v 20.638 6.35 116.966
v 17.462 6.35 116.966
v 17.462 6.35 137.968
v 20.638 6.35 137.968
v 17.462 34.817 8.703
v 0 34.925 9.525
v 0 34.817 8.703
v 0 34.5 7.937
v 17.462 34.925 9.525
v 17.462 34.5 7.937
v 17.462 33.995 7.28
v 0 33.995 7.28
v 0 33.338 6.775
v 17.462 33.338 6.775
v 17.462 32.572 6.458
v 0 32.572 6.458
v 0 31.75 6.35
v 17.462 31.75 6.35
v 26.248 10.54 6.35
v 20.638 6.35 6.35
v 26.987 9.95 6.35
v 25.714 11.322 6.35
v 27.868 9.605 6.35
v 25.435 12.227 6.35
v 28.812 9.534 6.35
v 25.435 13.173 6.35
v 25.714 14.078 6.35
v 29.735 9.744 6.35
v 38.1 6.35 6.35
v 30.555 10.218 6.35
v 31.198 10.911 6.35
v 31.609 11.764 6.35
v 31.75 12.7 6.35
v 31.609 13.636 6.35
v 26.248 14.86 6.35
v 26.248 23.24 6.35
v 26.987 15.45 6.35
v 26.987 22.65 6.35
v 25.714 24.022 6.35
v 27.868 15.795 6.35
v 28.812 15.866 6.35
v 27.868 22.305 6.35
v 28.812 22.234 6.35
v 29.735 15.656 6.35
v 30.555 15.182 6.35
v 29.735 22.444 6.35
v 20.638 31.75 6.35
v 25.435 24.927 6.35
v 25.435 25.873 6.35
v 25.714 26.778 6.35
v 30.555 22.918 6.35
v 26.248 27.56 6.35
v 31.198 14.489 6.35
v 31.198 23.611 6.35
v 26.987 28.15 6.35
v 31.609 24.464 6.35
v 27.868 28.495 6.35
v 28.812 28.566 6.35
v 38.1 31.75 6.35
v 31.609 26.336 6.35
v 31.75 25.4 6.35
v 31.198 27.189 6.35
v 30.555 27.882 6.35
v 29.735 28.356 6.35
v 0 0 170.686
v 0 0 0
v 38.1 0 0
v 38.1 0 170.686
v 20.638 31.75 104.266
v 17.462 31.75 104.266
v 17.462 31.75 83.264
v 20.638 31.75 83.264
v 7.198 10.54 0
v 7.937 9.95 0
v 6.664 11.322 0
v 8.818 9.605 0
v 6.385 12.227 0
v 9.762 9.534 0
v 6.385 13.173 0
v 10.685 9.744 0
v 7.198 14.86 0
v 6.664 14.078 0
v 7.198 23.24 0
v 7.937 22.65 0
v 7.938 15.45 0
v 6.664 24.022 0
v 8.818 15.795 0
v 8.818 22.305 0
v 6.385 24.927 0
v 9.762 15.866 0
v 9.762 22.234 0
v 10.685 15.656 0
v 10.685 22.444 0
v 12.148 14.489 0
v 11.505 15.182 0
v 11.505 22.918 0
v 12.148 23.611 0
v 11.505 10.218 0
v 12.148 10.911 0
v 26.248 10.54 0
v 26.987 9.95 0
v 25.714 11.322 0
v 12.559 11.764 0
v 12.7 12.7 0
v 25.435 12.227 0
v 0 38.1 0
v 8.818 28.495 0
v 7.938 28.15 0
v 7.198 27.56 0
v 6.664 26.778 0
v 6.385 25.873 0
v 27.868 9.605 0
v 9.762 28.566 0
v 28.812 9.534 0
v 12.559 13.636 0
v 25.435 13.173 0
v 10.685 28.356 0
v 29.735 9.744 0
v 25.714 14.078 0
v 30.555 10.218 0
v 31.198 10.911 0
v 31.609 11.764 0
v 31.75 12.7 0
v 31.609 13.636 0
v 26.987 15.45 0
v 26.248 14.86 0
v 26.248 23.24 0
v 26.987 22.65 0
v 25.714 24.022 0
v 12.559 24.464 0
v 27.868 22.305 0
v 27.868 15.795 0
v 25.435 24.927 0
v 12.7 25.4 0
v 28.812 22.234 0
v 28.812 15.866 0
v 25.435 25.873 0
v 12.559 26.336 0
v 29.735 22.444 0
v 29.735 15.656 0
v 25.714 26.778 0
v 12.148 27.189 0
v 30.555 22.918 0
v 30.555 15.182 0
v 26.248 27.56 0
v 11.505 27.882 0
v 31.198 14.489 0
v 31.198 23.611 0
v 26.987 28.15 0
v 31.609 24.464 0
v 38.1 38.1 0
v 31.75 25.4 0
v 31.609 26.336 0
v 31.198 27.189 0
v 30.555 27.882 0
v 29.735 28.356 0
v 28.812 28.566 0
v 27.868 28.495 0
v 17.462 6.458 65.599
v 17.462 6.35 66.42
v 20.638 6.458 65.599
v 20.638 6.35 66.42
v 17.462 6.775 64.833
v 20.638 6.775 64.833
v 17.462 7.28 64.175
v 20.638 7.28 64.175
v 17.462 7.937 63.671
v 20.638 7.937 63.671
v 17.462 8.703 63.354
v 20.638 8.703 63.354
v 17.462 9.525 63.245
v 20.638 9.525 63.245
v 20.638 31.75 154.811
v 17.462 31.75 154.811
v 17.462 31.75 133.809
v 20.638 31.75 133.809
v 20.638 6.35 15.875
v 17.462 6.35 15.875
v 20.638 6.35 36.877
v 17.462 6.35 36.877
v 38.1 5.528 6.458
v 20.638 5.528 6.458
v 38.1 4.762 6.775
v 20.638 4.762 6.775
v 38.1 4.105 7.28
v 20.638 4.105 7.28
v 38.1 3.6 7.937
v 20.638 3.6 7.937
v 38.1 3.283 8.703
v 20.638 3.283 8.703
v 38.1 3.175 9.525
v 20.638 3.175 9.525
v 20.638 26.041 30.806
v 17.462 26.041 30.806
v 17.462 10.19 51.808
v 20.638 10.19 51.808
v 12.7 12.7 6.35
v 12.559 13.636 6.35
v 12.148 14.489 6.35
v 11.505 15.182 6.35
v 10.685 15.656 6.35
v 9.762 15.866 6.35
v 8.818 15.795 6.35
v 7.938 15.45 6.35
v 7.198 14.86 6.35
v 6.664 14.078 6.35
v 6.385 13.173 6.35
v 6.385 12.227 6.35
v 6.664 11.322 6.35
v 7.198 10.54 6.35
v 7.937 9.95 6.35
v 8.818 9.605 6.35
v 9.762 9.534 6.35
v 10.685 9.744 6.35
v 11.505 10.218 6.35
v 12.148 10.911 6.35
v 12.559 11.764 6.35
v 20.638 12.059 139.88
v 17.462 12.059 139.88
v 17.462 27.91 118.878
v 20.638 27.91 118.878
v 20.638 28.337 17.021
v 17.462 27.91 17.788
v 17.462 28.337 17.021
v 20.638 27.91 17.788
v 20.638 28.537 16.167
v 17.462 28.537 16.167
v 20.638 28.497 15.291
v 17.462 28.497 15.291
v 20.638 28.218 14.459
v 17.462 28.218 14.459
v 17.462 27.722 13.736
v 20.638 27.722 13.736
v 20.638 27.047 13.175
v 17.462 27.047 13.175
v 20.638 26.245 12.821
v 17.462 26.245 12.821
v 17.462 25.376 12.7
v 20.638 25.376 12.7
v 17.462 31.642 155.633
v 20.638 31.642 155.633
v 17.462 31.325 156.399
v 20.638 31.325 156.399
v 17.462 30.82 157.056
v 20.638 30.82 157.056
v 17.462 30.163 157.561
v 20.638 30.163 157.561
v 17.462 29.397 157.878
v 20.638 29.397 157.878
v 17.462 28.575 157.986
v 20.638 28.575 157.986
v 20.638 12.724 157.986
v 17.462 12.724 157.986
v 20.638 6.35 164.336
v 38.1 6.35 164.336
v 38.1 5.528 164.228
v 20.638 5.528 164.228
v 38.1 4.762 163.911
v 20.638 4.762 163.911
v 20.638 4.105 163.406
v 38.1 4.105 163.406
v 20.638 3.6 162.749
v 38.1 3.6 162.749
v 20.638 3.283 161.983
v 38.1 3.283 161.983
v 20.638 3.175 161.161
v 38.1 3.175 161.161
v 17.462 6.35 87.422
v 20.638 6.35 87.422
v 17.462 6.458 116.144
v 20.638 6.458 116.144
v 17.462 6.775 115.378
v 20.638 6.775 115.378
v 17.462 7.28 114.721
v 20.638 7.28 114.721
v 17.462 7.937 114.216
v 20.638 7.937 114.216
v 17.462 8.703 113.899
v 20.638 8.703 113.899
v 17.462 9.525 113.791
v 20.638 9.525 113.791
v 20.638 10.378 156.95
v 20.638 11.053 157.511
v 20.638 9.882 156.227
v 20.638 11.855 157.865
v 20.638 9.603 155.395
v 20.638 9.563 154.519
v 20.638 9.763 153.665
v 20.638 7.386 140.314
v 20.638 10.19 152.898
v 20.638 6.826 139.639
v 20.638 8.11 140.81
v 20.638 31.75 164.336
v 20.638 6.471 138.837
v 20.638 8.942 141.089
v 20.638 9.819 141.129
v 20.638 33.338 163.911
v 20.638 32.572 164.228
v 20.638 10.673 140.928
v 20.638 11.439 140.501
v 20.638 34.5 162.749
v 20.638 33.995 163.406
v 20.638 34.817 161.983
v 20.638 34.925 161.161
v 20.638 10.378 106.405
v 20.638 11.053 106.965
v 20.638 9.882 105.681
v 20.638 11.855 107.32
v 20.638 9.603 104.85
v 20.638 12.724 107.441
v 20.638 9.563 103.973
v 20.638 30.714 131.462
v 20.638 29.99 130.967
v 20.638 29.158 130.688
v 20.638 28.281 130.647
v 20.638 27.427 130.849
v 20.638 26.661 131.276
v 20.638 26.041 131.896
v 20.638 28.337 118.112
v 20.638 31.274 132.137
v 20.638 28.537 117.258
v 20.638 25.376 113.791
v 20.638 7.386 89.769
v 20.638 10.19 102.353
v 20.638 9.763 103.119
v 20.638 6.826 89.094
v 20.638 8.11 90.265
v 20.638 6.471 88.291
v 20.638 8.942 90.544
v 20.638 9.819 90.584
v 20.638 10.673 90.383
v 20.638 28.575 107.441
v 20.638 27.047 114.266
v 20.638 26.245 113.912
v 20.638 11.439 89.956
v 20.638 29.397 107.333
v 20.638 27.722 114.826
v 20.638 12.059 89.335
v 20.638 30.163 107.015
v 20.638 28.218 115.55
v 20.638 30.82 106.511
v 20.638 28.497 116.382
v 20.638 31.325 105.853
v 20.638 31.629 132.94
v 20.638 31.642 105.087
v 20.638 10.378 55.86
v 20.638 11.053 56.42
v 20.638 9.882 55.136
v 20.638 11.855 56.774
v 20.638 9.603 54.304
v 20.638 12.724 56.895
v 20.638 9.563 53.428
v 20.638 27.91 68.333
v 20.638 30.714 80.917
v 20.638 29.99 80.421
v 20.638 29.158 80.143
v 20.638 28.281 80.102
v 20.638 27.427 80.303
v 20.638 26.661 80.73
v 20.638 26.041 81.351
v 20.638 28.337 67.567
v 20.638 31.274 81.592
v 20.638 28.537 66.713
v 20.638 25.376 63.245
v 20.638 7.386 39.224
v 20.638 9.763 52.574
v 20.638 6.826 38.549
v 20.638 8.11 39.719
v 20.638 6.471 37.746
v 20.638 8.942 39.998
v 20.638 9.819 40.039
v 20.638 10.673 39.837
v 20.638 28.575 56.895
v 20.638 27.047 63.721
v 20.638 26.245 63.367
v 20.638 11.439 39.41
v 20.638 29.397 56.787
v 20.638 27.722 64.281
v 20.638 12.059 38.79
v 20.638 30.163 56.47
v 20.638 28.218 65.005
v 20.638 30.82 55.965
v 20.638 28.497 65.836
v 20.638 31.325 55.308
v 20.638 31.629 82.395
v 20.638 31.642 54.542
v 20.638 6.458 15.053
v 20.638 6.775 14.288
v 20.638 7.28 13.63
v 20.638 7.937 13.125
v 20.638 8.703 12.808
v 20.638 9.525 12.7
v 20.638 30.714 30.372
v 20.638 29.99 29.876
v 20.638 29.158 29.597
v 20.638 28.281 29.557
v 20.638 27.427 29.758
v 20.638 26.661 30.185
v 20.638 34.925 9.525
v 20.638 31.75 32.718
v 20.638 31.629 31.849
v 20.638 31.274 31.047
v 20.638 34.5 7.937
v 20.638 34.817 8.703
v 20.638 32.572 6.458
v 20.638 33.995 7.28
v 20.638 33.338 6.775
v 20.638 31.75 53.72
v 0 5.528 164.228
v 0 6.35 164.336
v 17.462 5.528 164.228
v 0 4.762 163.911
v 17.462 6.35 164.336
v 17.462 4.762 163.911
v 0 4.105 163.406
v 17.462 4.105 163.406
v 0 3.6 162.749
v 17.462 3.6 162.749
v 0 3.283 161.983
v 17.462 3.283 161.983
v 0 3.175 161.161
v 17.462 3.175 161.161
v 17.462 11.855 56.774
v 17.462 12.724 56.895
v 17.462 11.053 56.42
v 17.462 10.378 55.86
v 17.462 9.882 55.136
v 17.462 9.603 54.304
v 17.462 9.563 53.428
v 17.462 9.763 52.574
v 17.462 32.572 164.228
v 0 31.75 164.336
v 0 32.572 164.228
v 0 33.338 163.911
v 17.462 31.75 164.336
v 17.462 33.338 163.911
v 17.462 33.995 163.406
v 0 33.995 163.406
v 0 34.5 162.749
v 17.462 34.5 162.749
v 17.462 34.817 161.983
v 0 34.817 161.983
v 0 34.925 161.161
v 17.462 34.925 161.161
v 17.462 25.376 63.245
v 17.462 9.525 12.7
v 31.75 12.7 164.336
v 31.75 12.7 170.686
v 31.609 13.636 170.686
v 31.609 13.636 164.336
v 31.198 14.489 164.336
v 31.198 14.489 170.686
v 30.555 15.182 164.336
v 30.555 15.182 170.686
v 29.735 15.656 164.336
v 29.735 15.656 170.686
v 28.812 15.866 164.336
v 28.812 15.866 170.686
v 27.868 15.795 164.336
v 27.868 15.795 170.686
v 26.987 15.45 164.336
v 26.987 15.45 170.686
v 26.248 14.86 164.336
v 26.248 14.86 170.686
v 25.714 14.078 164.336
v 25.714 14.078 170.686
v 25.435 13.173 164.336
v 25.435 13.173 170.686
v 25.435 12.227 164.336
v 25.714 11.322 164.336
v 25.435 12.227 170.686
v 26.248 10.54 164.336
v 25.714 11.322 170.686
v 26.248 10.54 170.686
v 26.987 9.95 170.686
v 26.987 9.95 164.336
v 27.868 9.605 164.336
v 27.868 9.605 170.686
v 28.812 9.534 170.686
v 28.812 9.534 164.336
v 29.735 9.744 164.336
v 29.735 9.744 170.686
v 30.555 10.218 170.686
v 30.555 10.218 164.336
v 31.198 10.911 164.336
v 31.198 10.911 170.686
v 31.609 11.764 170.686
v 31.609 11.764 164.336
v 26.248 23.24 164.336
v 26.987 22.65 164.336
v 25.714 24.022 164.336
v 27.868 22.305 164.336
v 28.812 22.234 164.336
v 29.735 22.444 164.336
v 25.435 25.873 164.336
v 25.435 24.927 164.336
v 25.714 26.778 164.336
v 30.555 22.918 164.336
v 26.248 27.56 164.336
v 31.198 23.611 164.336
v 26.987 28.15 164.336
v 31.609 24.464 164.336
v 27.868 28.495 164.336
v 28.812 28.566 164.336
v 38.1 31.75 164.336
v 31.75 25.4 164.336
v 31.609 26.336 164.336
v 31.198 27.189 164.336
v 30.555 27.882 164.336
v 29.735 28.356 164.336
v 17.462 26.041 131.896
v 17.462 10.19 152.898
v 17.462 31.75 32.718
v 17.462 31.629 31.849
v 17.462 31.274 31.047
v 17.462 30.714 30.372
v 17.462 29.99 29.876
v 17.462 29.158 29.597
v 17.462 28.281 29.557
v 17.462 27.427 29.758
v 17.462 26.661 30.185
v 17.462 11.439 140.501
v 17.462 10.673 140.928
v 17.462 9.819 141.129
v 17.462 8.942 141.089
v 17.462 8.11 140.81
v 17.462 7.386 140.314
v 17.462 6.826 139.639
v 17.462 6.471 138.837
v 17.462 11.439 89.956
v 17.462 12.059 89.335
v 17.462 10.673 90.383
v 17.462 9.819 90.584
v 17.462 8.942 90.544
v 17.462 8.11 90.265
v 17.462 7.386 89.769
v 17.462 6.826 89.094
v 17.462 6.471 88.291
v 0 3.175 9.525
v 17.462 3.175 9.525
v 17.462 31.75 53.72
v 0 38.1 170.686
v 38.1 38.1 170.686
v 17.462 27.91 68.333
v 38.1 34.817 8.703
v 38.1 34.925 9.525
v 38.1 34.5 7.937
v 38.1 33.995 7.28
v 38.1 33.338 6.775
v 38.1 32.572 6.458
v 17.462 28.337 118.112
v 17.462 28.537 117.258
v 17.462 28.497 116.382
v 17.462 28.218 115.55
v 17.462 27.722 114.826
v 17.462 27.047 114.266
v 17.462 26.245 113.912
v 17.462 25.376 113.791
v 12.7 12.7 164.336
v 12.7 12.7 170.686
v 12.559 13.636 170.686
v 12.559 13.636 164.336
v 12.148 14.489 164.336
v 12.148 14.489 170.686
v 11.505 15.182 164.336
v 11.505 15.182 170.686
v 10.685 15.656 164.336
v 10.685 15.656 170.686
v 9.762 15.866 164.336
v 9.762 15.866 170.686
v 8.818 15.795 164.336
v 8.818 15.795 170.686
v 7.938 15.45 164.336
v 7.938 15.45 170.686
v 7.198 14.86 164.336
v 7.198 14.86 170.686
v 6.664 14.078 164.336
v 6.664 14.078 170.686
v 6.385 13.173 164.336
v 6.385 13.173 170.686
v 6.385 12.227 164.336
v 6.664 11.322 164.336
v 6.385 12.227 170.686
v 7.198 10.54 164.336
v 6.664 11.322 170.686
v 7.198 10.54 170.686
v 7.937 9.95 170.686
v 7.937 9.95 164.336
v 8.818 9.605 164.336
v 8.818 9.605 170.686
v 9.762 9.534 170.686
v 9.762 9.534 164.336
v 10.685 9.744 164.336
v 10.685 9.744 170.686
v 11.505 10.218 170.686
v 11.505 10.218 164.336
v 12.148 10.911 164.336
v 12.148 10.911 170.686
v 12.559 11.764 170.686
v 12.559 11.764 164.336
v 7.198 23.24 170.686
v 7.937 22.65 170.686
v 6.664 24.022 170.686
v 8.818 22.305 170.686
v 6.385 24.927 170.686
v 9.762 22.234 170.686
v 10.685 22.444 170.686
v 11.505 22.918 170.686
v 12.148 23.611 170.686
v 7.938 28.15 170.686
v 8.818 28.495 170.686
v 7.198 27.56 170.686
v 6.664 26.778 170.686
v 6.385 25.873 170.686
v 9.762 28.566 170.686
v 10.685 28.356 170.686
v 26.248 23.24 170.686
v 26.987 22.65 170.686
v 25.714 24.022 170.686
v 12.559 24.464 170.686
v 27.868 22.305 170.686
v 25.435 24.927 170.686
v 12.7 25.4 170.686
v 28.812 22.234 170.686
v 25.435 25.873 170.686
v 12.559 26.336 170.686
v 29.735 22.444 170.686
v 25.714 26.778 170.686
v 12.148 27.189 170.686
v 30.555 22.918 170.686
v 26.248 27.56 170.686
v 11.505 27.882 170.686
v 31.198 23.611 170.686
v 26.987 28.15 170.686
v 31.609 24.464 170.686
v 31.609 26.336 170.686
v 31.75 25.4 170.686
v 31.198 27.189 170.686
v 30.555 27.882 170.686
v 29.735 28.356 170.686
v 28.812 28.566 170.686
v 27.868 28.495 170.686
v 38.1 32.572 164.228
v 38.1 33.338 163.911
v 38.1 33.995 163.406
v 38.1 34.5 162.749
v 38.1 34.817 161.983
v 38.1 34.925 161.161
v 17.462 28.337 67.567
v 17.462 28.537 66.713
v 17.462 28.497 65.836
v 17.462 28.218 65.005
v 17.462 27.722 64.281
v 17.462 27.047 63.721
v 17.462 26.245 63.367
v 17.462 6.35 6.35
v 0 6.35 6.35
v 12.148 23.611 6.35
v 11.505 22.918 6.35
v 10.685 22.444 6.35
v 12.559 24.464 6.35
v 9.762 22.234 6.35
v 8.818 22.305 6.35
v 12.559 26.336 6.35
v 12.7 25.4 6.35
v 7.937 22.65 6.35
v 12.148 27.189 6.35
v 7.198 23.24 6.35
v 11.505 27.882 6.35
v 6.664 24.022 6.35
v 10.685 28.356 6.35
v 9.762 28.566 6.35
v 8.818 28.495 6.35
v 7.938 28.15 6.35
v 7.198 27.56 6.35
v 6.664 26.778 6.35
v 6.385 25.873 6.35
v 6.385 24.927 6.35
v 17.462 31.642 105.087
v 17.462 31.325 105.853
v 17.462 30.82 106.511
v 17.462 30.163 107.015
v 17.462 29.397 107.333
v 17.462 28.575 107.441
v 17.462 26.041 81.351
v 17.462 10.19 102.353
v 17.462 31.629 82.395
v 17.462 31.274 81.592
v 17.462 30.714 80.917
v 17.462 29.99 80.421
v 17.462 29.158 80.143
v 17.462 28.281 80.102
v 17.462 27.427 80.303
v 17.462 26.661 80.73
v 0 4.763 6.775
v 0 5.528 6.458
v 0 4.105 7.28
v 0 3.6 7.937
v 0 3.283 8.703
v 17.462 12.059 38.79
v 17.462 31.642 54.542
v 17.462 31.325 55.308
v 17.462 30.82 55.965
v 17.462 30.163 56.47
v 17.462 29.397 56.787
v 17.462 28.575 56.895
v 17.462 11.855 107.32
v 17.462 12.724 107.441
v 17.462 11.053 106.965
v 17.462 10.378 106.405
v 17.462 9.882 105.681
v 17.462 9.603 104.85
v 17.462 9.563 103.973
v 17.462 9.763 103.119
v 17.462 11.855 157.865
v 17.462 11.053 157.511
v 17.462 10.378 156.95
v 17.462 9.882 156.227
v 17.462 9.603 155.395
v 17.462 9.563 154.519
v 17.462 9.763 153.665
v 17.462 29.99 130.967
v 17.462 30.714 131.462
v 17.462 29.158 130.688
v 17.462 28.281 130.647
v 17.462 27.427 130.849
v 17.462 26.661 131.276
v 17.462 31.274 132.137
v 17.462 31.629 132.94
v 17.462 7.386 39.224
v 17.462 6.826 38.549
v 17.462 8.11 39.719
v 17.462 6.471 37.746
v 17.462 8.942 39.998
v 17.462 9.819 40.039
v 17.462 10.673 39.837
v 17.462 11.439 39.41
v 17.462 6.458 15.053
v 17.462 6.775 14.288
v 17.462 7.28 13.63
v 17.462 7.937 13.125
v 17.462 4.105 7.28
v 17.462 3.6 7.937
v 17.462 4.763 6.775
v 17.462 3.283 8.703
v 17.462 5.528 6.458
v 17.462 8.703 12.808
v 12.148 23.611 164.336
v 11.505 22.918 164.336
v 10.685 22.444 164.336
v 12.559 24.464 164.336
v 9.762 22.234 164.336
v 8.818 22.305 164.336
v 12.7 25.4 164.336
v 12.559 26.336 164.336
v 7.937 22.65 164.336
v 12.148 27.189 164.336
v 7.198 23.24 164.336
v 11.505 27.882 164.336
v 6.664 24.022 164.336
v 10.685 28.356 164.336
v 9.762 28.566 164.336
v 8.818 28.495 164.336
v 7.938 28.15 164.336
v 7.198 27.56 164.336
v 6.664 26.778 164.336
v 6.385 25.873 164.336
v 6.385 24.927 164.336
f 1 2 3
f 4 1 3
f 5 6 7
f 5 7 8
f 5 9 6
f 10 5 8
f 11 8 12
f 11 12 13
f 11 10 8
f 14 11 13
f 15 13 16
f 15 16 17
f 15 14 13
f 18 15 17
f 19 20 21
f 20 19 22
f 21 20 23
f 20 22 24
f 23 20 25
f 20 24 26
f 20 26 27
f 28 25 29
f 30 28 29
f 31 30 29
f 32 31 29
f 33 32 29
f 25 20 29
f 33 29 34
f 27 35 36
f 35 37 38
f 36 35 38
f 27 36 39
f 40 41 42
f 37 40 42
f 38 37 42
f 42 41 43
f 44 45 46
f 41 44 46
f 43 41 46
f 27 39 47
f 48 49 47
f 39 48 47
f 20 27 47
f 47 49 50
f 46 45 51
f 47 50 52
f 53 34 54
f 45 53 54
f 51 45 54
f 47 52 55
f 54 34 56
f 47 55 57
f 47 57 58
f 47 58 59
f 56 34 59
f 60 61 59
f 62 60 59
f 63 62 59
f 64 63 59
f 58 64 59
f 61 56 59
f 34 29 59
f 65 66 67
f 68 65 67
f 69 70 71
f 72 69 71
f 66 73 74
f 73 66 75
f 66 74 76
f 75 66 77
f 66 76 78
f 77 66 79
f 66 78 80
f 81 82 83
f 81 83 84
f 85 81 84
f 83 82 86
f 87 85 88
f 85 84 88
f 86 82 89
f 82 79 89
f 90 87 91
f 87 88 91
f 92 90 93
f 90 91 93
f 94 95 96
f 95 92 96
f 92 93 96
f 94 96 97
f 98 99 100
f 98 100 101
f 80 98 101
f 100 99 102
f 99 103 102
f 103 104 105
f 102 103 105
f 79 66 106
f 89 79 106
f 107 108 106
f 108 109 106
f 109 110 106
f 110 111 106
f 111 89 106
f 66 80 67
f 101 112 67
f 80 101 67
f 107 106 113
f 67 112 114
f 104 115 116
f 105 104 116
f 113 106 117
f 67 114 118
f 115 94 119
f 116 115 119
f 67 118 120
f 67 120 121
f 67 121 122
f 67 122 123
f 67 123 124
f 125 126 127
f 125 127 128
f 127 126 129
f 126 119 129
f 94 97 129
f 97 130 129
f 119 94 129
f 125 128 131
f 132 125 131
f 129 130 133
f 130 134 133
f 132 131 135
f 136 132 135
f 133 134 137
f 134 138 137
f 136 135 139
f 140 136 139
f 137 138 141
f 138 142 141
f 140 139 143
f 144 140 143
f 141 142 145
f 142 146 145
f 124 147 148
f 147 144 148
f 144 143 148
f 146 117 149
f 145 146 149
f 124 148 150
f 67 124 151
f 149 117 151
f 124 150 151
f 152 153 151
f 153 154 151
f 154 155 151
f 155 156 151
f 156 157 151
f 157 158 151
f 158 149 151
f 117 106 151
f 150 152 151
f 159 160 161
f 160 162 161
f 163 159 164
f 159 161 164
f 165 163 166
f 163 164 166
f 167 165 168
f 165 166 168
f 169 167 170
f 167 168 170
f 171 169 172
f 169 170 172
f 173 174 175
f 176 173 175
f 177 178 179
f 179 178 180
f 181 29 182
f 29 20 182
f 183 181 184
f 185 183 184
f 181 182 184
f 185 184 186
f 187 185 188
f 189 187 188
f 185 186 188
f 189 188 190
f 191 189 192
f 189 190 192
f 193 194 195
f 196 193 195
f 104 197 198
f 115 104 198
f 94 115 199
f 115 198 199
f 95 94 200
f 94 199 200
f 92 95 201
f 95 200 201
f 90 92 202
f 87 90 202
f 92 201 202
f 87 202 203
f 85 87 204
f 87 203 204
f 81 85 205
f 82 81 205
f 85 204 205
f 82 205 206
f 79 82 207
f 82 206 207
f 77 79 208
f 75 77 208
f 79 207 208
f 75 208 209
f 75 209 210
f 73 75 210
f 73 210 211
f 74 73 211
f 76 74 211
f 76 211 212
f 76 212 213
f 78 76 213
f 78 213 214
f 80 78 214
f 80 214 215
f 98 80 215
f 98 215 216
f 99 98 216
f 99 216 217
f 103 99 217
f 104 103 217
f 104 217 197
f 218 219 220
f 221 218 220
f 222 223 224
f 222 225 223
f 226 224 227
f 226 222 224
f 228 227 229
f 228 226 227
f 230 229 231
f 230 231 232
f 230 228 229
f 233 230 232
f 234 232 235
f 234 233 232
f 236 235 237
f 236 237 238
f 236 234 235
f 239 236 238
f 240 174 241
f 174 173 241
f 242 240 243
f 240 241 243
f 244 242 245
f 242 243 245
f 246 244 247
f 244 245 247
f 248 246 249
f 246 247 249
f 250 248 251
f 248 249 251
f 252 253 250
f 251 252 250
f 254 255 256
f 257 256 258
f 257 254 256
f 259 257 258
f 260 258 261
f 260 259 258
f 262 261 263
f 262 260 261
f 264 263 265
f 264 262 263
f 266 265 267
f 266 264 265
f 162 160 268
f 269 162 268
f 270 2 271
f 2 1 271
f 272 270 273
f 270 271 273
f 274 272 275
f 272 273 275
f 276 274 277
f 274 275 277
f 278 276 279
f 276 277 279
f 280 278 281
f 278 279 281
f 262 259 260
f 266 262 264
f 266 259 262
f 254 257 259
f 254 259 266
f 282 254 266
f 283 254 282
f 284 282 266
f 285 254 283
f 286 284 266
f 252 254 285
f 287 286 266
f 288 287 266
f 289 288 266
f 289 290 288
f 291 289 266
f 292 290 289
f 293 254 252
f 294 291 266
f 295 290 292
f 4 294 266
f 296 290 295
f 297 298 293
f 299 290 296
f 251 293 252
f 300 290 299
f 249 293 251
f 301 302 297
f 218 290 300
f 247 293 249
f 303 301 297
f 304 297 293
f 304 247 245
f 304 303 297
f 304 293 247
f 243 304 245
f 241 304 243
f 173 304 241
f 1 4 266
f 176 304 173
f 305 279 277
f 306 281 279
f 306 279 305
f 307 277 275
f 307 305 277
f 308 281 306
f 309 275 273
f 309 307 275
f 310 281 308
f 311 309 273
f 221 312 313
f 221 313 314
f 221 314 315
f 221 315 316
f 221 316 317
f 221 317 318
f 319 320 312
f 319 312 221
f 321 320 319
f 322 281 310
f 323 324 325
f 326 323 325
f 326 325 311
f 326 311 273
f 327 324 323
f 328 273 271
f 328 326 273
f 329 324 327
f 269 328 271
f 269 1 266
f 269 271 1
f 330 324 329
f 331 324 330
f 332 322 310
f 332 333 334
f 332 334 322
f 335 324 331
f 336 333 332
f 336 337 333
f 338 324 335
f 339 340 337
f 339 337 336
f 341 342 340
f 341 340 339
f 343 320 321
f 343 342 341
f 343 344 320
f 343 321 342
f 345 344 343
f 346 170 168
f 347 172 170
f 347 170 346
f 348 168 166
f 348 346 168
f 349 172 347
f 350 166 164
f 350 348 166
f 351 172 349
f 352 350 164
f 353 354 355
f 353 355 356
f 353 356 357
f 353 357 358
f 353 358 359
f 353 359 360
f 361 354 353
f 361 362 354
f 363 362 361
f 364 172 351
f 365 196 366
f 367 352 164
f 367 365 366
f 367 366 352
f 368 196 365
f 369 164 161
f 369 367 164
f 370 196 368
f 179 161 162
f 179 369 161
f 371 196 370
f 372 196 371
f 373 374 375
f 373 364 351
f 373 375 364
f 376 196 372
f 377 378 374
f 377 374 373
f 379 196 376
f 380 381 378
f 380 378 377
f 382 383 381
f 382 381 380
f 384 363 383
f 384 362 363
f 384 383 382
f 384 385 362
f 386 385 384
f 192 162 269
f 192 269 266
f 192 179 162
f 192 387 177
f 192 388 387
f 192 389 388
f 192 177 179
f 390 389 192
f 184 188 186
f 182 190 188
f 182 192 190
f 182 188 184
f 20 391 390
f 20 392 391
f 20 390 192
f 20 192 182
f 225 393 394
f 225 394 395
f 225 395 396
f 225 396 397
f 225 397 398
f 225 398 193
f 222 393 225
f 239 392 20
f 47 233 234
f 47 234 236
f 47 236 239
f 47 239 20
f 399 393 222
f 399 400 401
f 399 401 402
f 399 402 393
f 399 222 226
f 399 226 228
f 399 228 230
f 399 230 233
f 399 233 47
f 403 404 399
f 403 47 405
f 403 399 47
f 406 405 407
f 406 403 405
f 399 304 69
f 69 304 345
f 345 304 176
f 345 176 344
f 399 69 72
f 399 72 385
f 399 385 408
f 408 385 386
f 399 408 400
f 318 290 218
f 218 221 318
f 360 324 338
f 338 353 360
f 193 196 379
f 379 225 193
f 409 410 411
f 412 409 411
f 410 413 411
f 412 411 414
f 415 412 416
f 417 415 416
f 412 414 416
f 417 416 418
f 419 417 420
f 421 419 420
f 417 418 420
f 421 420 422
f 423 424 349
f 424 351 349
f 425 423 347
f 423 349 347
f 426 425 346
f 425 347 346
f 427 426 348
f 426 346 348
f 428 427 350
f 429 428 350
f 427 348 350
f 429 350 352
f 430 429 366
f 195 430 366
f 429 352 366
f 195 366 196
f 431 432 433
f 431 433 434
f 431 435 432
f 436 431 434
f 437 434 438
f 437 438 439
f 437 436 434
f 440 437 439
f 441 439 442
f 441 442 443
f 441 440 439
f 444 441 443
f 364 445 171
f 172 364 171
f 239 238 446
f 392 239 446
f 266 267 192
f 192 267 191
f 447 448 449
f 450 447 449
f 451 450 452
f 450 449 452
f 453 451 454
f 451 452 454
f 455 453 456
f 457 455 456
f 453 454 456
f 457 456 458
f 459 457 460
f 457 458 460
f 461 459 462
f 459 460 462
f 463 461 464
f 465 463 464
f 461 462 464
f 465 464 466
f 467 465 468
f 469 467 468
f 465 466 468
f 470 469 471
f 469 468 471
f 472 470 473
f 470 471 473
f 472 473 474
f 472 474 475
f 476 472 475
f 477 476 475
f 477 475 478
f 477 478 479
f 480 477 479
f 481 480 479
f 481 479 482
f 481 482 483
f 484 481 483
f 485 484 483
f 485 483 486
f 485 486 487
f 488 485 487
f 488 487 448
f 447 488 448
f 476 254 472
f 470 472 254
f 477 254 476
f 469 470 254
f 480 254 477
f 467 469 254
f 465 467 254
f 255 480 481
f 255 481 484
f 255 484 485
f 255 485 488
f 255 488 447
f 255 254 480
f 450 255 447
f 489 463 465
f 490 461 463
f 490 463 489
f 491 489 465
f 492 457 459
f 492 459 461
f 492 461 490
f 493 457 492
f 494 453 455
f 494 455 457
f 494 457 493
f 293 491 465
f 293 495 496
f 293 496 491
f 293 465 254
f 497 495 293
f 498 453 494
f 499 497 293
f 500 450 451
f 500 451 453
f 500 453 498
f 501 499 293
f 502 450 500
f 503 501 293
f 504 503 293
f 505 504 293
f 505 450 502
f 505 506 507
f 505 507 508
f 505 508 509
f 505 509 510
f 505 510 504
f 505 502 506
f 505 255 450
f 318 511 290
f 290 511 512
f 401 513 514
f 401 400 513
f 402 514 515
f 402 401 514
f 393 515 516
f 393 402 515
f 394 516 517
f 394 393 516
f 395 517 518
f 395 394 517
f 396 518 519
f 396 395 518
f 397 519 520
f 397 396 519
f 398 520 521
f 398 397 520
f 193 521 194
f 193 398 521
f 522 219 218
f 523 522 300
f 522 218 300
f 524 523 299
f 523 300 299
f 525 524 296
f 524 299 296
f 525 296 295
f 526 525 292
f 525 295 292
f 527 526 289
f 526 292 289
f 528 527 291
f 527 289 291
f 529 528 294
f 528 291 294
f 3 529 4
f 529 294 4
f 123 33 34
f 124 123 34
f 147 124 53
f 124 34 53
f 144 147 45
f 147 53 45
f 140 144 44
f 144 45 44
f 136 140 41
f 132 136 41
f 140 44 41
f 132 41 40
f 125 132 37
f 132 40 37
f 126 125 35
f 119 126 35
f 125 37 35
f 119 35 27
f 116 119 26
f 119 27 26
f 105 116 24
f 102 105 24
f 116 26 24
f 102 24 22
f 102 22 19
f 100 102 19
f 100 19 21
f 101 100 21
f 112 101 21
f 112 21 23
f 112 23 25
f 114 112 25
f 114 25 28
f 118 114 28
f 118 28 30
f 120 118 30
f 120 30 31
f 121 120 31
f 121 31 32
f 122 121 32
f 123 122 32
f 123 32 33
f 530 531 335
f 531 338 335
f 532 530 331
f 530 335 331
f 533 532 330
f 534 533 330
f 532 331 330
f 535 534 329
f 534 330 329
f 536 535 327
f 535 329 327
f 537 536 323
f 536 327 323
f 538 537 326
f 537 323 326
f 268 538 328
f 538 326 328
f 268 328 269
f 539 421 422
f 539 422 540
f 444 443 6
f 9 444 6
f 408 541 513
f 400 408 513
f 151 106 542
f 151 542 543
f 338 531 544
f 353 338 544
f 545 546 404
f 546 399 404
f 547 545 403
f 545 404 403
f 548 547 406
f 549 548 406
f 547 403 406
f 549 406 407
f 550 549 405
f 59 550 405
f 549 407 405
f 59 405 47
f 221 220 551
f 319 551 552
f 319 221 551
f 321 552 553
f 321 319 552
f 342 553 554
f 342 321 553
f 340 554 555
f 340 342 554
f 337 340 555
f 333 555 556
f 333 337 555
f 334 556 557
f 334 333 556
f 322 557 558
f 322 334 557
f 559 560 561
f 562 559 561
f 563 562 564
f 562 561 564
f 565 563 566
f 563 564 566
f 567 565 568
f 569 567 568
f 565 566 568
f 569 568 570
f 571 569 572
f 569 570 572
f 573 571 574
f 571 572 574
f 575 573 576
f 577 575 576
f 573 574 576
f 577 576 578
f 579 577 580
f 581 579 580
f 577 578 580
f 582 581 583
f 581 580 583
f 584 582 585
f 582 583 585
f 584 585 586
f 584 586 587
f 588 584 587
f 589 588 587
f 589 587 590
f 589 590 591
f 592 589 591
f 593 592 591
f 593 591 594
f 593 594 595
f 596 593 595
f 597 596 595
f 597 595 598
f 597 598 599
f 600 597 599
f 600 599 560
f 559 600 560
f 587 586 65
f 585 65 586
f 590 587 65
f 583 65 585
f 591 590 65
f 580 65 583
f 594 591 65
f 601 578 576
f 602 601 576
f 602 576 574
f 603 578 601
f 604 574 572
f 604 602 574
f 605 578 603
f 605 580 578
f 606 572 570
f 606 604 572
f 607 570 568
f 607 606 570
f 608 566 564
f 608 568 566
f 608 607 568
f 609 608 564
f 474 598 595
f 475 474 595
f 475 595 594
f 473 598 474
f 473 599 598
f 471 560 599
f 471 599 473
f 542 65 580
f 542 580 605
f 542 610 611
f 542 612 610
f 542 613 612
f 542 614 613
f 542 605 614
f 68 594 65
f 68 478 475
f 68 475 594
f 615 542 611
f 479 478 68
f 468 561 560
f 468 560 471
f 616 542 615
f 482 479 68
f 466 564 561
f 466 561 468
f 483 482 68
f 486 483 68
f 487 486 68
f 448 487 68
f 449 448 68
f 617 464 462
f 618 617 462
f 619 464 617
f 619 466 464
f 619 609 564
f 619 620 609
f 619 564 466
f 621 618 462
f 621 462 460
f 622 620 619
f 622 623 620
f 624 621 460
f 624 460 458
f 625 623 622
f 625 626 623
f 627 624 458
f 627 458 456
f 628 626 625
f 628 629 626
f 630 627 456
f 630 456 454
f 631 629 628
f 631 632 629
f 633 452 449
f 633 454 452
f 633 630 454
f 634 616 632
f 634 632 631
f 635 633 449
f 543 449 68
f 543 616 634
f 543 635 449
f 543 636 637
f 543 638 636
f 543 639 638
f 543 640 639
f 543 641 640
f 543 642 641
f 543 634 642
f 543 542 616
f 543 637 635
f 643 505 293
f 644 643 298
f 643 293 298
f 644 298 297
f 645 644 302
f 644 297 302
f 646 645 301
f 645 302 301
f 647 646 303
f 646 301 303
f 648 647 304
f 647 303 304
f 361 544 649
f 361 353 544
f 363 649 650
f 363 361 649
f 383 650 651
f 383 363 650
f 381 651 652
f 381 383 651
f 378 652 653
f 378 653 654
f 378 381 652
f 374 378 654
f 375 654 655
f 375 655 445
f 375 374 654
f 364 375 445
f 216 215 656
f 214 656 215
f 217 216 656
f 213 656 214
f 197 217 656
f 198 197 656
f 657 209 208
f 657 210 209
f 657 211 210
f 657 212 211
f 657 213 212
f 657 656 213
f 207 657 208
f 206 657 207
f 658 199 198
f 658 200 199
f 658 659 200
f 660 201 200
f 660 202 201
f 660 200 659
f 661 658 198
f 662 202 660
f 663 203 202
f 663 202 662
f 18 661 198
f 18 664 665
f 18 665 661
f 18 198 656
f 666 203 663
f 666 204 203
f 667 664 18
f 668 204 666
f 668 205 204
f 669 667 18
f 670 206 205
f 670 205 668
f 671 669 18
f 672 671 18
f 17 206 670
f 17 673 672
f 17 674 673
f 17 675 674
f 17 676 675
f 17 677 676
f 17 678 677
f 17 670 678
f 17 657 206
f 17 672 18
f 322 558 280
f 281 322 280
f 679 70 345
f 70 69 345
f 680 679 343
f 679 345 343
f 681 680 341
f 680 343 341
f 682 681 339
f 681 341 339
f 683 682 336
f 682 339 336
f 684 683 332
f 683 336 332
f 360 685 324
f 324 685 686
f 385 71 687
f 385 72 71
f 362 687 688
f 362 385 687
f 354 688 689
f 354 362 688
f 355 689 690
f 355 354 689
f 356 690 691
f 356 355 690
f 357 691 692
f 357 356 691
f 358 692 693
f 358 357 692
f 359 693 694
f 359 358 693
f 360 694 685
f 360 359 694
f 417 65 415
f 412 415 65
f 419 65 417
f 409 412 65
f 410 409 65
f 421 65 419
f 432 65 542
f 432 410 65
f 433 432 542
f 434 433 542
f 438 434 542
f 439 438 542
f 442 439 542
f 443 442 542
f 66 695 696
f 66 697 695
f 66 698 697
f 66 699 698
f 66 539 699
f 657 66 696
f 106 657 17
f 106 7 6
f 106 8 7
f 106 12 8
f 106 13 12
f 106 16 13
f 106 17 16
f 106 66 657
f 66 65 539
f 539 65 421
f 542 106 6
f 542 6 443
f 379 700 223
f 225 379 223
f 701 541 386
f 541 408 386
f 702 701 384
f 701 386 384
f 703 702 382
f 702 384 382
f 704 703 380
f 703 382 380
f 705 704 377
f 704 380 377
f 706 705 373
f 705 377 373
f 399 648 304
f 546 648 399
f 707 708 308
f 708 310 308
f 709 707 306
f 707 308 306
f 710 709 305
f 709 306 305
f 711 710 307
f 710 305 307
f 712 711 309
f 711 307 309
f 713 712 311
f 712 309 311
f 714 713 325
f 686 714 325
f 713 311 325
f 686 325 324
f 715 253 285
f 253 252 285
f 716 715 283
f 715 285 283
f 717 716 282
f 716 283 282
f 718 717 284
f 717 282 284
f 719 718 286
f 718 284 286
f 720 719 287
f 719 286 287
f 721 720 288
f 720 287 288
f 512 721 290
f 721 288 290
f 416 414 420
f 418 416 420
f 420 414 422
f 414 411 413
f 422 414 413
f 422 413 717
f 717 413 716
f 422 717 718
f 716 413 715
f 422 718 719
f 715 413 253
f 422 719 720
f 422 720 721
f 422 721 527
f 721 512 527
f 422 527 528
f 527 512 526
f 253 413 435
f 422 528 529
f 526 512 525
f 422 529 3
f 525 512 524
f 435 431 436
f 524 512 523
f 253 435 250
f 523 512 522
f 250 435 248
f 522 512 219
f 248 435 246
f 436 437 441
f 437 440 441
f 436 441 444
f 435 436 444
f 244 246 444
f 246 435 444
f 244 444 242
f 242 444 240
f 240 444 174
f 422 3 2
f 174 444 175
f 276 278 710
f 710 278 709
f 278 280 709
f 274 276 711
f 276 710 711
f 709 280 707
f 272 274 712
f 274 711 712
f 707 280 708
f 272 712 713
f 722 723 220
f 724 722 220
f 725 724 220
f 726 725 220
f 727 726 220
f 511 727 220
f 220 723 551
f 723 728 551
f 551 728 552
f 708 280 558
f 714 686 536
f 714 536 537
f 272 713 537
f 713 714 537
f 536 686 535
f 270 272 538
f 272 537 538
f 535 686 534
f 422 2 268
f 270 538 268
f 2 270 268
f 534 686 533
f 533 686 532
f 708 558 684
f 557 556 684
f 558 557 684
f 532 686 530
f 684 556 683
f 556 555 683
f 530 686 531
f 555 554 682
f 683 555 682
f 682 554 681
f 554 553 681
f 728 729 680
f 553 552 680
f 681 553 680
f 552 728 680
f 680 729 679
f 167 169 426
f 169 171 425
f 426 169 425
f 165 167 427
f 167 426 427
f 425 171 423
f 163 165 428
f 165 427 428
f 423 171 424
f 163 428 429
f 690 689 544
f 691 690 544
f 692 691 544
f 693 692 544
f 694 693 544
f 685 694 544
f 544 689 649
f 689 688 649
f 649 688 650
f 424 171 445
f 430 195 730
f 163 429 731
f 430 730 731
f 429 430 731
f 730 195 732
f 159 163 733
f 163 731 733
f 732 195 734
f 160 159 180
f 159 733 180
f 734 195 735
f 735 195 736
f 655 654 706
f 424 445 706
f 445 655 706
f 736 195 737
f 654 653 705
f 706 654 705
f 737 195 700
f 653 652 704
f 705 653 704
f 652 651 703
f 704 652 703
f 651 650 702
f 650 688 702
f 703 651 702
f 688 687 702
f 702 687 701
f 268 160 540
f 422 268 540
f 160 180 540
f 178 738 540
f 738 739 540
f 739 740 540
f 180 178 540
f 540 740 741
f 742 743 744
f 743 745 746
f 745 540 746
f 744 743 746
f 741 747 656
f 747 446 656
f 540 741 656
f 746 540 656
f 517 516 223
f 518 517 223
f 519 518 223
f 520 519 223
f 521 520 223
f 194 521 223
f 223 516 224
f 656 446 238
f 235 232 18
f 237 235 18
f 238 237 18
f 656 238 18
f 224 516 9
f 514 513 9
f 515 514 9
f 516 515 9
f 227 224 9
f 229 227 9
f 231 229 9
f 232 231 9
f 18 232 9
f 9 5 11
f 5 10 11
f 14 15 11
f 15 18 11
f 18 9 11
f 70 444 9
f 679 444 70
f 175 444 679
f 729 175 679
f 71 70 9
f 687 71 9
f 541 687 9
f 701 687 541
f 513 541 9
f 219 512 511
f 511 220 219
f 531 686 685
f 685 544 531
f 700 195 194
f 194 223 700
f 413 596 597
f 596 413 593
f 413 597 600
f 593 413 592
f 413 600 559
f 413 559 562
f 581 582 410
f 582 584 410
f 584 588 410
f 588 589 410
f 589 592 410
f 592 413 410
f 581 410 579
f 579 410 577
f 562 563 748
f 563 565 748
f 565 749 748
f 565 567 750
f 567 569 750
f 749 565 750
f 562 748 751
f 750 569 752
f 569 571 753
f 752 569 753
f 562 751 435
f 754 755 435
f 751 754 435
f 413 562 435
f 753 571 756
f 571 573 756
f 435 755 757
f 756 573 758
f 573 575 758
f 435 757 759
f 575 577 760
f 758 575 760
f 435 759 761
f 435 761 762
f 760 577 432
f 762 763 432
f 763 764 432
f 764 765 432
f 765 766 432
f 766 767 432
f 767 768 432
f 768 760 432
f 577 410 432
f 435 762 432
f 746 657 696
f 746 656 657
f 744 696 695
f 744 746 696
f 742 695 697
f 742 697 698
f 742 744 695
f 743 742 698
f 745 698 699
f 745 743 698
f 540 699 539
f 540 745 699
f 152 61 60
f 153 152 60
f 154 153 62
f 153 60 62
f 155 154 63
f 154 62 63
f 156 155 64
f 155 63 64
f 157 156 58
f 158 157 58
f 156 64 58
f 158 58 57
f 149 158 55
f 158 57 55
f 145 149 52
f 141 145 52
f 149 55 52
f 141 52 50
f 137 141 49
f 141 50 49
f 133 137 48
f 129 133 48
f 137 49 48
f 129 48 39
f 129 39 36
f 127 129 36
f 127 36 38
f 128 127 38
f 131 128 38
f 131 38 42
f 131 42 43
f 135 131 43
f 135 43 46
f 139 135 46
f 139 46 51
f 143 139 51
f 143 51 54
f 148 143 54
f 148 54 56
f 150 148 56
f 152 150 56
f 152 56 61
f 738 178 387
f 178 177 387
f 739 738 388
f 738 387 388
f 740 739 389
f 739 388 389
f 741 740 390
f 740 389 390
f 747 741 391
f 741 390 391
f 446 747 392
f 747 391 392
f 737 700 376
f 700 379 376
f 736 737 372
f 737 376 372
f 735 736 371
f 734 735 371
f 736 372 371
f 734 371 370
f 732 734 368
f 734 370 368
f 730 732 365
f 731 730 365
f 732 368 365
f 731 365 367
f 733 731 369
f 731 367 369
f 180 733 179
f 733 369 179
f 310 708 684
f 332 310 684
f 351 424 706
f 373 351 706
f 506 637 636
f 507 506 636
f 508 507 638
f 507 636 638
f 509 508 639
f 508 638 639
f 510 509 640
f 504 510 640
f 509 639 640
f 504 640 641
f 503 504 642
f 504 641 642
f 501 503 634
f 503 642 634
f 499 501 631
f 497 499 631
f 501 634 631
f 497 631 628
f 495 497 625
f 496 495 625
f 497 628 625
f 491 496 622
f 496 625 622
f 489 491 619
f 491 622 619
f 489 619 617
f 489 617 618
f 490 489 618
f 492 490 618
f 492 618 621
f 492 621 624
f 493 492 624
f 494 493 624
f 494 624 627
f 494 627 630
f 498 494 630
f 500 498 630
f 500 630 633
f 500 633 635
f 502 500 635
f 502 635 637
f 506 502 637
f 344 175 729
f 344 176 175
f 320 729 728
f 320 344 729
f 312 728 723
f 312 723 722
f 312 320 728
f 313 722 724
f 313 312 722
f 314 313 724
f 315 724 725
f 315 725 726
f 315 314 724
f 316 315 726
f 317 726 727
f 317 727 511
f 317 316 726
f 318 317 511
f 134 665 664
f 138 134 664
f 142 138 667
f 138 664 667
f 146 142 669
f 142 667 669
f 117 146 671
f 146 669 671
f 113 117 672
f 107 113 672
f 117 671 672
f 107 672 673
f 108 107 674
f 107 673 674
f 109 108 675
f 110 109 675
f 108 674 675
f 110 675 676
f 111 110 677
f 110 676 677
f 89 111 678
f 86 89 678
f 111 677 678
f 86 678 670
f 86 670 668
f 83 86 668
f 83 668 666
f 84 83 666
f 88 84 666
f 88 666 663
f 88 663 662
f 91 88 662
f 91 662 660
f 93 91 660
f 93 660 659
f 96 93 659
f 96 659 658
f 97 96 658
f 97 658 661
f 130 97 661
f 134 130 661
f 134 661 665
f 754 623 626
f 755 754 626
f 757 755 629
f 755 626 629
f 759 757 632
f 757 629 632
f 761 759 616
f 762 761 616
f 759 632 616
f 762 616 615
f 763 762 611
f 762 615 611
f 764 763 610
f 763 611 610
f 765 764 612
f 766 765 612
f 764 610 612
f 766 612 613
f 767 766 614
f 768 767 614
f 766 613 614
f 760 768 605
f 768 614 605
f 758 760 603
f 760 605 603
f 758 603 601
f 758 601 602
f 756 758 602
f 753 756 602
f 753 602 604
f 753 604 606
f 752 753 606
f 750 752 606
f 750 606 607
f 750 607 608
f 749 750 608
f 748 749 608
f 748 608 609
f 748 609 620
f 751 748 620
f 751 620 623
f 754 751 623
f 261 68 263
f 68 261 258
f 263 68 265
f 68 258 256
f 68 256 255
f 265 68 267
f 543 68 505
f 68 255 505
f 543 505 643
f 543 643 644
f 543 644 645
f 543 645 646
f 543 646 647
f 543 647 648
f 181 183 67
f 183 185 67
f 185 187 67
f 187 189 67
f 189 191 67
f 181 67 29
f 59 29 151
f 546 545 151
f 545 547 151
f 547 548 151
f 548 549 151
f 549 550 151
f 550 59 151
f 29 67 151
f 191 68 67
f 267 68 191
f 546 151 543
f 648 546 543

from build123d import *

# Parameters (mm, degrees)
SKETCH2_W                   = 38.1
SKETCH2_H                   = 38.1
BOSS_EXTRUDE1_DEPTH         = 170.686028715
SKETCH3_W                   = 157.986028715
SKETCH3_H                   = 31.75
CUT_EXTRUDE1_DEPTH          = 17.4625
FILLET1_R                   = 3.175
FILLET1_OF_MIRROR1_R        = 3.175
F_1_4_0_25_DIAMETER_HOLE1_D = 6.35
CUT_EXTRUDE2_REACH          = 178.1
FILLET3_R                   = 3.175


with BuildPart() as part:
    # Sketch2 → Boss-Extrude1 (new body)
    with BuildSketch(Plane.XY):
        with Locations((19.05, 19.05)):
            Rectangle(SKETCH2_W, SKETCH2_H)
    extrude(amount=BOSS_EXTRUDE1_DEPTH)

    # Sketch3 → Cut-Extrude1 (cut)
    with BuildSketch(Plane(origin=(38.1, 0, 0), x_dir=(0, 0, -1), z_dir=(1, 0, 0))):
        with Locations((-85.343014357, 19.05)):
            Rectangle(SKETCH3_W, SKETCH3_H)
    cut_extrude1 = extrude(amount=-CUT_EXTRUDE1_DEPTH, mode=Mode.SUBTRACT)

    # Fillet1
    fillet1_edges = [part.edges().sort_by_distance(p)[0] for p in [
        (29.36875, 3.175, 164.336028715),
        (29.36875, 34.925, 164.336028715),
        (29.36875, 34.925, 6.35),
        (29.36875, 3.175, 6.35),
    ]]
    fillet(fillet1_edges, radius=FILLET1_R)

    # Mirror1: Cut-Extrude1 across plane
    add(cut_extrude1.mirror(Plane(origin=(19.05, 0, 0), x_dir=(0, 0, 1), z_dir=(1, 0, 0))), mode=Mode.SUBTRACT)

    # Fillet1 of Mirror1
    fillet1_of_mirror1_edges = [part.edges().sort_by_distance(p)[0] for p in [
        (8.73125, 3.175, 164.336028715),
        (8.73125, 34.925, 164.336028715),
        (8.73125, 34.925, 6.35),
        (8.73125, 3.175, 6.35),
    ]]
    fillet(fillet1_of_mirror1_edges, radius=FILLET1_OF_MIRROR1_R)

    # 1/4 (0.25) Diameter Hole1 (through all)
    with Locations(Plane(origin=(0, 0, 0), x_dir=(-1, 0, 0), z_dir=(0, 0, -1))):
        with Locations((-9.525, 25.4), (-9.525, 12.7), (-28.575, 12.7), (-28.575, 25.4)):
            Hole(F_1_4_0_25_DIAMETER_HOLE1_D / 2)

    # Sketch7 → Cut-Extrude2 (cut, up to next)
    with BuildSketch(Plane.ZY.offset(-17.4625), mode=Mode.PRIVATE) as cut_extrude2_sk1:
        Polygon((12.7, 31.75), (12.7, 6.35), (46.354412352, 6.35), align=None)
    cut_extrude2_tool1 = extrude(cut_extrude2_sk1.sketch, amount=-CUT_EXTRUDE2_REACH, mode=Mode.PRIVATE) & part.part
    # Sketch7 → Cut-Extrude2 (cut, up to next)
    with BuildSketch(Plane.ZY.offset(-17.4625), mode=Mode.PRIVATE) as cut_extrude2_sk2:
        Polygon((23.240930553, 31.75), (56.895342905, 6.35), (56.895342905, 31.75), align=None)
    cut_extrude2_tool2 = extrude(cut_extrude2_sk2.sketch, amount=-CUT_EXTRUDE2_REACH, mode=Mode.PRIVATE) & part.part
    # Sketch7 → Cut-Extrude2 (cut, up to next)
    with BuildSketch(Plane.ZY.offset(-17.4625), mode=Mode.PRIVATE) as cut_extrude2_sk3:
        Polygon((63.245342905, 31.75), (63.245342905, 6.35), (96.899755257, 6.35), align=None)
    cut_extrude2_tool3 = extrude(cut_extrude2_sk3.sketch, amount=-CUT_EXTRUDE2_REACH, mode=Mode.PRIVATE) & part.part
    # Sketch7 → Cut-Extrude2 (cut, up to next)
    with BuildSketch(Plane.ZY.offset(-17.4625), mode=Mode.PRIVATE) as cut_extrude2_sk4:
        Polygon((73.786273458, 31.75), (107.44068581, 6.35), (107.44068581, 31.75), align=None)
    cut_extrude2_tool4 = extrude(cut_extrude2_sk4.sketch, amount=-CUT_EXTRUDE2_REACH, mode=Mode.PRIVATE) & part.part
    # Sketch7 → Cut-Extrude2 (cut, up to next)
    with BuildSketch(Plane.ZY.offset(-17.4625), mode=Mode.PRIVATE) as cut_extrude2_sk5:
        Polygon((113.79068581, 31.75), (113.79068581, 6.35), (147.445098162, 6.35), align=None)
    cut_extrude2_tool5 = extrude(cut_extrude2_sk5.sketch, amount=-CUT_EXTRUDE2_REACH, mode=Mode.PRIVATE) & part.part
    # Sketch7 → Cut-Extrude2 (cut, up to next)
    with BuildSketch(Plane.ZY.offset(-17.4625), mode=Mode.PRIVATE) as cut_extrude2_sk6:
        Polygon((124.331616363, 31.75), (157.986028715, 6.35), (157.986028715, 31.75), align=None)
    cut_extrude2_tool6 = extrude(cut_extrude2_sk6.sketch, amount=-CUT_EXTRUDE2_REACH, mode=Mode.PRIVATE) & part.part
    add(cut_extrude2_tool1.solids().sort_by_distance((17.4625, 14.816667, 23.918137))[0], mode=Mode.SUBTRACT)
    add(cut_extrude2_tool2.solids().sort_by_distance((17.4625, 23.283333, 45.677205))[0], mode=Mode.SUBTRACT)
    add(cut_extrude2_tool3.solids().sort_by_distance((17.4625, 14.816667, 74.46348))[0], mode=Mode.SUBTRACT)
    add(cut_extrude2_tool4.solids().sort_by_distance((17.4625, 23.283333, 96.222548))[0], mode=Mode.SUBTRACT)
    add(cut_extrude2_tool5.solids().sort_by_distance((17.4625, 14.816667, 125.008823))[0], mode=Mode.SUBTRACT)
    add(cut_extrude2_tool6.solids().sort_by_distance((17.4625, 23.283333, 146.767891))[0], mode=Mode.SUBTRACT)

    # Fillet3
    fillet3_edges = [part.edges().sort_by_distance(p)[0] for p in [
        (19.05, 31.75, 12.7),
        (19.05, 6.35, 46.354412352),
        (19.05, 6.35, 12.7),
        (19.05, 31.75, 23.240930553),
        (19.05, 31.75, 56.895342905),
        (19.05, 6.35, 56.895342905),
        (19.05, 31.75, 63.245342905),
        (19.05, 6.35, 96.899755257),
        (19.05, 6.35, 63.245342905),
        (19.05, 31.75, 113.79068581),
        (19.05, 6.35, 147.445098162),
        (19.05, 6.35, 113.79068581),
        (19.05, 31.75, 73.786273458),
        (19.05, 31.75, 107.44068581),
        (19.05, 6.35, 107.44068581),
        (19.05, 31.75, 124.331616363),
        (19.05, 31.75, 157.986028715),
        (19.05, 6.35, 157.986028715),
    ]]
    fillet(fillet3_edges, radius=FILLET3_R)


solid = part.part
